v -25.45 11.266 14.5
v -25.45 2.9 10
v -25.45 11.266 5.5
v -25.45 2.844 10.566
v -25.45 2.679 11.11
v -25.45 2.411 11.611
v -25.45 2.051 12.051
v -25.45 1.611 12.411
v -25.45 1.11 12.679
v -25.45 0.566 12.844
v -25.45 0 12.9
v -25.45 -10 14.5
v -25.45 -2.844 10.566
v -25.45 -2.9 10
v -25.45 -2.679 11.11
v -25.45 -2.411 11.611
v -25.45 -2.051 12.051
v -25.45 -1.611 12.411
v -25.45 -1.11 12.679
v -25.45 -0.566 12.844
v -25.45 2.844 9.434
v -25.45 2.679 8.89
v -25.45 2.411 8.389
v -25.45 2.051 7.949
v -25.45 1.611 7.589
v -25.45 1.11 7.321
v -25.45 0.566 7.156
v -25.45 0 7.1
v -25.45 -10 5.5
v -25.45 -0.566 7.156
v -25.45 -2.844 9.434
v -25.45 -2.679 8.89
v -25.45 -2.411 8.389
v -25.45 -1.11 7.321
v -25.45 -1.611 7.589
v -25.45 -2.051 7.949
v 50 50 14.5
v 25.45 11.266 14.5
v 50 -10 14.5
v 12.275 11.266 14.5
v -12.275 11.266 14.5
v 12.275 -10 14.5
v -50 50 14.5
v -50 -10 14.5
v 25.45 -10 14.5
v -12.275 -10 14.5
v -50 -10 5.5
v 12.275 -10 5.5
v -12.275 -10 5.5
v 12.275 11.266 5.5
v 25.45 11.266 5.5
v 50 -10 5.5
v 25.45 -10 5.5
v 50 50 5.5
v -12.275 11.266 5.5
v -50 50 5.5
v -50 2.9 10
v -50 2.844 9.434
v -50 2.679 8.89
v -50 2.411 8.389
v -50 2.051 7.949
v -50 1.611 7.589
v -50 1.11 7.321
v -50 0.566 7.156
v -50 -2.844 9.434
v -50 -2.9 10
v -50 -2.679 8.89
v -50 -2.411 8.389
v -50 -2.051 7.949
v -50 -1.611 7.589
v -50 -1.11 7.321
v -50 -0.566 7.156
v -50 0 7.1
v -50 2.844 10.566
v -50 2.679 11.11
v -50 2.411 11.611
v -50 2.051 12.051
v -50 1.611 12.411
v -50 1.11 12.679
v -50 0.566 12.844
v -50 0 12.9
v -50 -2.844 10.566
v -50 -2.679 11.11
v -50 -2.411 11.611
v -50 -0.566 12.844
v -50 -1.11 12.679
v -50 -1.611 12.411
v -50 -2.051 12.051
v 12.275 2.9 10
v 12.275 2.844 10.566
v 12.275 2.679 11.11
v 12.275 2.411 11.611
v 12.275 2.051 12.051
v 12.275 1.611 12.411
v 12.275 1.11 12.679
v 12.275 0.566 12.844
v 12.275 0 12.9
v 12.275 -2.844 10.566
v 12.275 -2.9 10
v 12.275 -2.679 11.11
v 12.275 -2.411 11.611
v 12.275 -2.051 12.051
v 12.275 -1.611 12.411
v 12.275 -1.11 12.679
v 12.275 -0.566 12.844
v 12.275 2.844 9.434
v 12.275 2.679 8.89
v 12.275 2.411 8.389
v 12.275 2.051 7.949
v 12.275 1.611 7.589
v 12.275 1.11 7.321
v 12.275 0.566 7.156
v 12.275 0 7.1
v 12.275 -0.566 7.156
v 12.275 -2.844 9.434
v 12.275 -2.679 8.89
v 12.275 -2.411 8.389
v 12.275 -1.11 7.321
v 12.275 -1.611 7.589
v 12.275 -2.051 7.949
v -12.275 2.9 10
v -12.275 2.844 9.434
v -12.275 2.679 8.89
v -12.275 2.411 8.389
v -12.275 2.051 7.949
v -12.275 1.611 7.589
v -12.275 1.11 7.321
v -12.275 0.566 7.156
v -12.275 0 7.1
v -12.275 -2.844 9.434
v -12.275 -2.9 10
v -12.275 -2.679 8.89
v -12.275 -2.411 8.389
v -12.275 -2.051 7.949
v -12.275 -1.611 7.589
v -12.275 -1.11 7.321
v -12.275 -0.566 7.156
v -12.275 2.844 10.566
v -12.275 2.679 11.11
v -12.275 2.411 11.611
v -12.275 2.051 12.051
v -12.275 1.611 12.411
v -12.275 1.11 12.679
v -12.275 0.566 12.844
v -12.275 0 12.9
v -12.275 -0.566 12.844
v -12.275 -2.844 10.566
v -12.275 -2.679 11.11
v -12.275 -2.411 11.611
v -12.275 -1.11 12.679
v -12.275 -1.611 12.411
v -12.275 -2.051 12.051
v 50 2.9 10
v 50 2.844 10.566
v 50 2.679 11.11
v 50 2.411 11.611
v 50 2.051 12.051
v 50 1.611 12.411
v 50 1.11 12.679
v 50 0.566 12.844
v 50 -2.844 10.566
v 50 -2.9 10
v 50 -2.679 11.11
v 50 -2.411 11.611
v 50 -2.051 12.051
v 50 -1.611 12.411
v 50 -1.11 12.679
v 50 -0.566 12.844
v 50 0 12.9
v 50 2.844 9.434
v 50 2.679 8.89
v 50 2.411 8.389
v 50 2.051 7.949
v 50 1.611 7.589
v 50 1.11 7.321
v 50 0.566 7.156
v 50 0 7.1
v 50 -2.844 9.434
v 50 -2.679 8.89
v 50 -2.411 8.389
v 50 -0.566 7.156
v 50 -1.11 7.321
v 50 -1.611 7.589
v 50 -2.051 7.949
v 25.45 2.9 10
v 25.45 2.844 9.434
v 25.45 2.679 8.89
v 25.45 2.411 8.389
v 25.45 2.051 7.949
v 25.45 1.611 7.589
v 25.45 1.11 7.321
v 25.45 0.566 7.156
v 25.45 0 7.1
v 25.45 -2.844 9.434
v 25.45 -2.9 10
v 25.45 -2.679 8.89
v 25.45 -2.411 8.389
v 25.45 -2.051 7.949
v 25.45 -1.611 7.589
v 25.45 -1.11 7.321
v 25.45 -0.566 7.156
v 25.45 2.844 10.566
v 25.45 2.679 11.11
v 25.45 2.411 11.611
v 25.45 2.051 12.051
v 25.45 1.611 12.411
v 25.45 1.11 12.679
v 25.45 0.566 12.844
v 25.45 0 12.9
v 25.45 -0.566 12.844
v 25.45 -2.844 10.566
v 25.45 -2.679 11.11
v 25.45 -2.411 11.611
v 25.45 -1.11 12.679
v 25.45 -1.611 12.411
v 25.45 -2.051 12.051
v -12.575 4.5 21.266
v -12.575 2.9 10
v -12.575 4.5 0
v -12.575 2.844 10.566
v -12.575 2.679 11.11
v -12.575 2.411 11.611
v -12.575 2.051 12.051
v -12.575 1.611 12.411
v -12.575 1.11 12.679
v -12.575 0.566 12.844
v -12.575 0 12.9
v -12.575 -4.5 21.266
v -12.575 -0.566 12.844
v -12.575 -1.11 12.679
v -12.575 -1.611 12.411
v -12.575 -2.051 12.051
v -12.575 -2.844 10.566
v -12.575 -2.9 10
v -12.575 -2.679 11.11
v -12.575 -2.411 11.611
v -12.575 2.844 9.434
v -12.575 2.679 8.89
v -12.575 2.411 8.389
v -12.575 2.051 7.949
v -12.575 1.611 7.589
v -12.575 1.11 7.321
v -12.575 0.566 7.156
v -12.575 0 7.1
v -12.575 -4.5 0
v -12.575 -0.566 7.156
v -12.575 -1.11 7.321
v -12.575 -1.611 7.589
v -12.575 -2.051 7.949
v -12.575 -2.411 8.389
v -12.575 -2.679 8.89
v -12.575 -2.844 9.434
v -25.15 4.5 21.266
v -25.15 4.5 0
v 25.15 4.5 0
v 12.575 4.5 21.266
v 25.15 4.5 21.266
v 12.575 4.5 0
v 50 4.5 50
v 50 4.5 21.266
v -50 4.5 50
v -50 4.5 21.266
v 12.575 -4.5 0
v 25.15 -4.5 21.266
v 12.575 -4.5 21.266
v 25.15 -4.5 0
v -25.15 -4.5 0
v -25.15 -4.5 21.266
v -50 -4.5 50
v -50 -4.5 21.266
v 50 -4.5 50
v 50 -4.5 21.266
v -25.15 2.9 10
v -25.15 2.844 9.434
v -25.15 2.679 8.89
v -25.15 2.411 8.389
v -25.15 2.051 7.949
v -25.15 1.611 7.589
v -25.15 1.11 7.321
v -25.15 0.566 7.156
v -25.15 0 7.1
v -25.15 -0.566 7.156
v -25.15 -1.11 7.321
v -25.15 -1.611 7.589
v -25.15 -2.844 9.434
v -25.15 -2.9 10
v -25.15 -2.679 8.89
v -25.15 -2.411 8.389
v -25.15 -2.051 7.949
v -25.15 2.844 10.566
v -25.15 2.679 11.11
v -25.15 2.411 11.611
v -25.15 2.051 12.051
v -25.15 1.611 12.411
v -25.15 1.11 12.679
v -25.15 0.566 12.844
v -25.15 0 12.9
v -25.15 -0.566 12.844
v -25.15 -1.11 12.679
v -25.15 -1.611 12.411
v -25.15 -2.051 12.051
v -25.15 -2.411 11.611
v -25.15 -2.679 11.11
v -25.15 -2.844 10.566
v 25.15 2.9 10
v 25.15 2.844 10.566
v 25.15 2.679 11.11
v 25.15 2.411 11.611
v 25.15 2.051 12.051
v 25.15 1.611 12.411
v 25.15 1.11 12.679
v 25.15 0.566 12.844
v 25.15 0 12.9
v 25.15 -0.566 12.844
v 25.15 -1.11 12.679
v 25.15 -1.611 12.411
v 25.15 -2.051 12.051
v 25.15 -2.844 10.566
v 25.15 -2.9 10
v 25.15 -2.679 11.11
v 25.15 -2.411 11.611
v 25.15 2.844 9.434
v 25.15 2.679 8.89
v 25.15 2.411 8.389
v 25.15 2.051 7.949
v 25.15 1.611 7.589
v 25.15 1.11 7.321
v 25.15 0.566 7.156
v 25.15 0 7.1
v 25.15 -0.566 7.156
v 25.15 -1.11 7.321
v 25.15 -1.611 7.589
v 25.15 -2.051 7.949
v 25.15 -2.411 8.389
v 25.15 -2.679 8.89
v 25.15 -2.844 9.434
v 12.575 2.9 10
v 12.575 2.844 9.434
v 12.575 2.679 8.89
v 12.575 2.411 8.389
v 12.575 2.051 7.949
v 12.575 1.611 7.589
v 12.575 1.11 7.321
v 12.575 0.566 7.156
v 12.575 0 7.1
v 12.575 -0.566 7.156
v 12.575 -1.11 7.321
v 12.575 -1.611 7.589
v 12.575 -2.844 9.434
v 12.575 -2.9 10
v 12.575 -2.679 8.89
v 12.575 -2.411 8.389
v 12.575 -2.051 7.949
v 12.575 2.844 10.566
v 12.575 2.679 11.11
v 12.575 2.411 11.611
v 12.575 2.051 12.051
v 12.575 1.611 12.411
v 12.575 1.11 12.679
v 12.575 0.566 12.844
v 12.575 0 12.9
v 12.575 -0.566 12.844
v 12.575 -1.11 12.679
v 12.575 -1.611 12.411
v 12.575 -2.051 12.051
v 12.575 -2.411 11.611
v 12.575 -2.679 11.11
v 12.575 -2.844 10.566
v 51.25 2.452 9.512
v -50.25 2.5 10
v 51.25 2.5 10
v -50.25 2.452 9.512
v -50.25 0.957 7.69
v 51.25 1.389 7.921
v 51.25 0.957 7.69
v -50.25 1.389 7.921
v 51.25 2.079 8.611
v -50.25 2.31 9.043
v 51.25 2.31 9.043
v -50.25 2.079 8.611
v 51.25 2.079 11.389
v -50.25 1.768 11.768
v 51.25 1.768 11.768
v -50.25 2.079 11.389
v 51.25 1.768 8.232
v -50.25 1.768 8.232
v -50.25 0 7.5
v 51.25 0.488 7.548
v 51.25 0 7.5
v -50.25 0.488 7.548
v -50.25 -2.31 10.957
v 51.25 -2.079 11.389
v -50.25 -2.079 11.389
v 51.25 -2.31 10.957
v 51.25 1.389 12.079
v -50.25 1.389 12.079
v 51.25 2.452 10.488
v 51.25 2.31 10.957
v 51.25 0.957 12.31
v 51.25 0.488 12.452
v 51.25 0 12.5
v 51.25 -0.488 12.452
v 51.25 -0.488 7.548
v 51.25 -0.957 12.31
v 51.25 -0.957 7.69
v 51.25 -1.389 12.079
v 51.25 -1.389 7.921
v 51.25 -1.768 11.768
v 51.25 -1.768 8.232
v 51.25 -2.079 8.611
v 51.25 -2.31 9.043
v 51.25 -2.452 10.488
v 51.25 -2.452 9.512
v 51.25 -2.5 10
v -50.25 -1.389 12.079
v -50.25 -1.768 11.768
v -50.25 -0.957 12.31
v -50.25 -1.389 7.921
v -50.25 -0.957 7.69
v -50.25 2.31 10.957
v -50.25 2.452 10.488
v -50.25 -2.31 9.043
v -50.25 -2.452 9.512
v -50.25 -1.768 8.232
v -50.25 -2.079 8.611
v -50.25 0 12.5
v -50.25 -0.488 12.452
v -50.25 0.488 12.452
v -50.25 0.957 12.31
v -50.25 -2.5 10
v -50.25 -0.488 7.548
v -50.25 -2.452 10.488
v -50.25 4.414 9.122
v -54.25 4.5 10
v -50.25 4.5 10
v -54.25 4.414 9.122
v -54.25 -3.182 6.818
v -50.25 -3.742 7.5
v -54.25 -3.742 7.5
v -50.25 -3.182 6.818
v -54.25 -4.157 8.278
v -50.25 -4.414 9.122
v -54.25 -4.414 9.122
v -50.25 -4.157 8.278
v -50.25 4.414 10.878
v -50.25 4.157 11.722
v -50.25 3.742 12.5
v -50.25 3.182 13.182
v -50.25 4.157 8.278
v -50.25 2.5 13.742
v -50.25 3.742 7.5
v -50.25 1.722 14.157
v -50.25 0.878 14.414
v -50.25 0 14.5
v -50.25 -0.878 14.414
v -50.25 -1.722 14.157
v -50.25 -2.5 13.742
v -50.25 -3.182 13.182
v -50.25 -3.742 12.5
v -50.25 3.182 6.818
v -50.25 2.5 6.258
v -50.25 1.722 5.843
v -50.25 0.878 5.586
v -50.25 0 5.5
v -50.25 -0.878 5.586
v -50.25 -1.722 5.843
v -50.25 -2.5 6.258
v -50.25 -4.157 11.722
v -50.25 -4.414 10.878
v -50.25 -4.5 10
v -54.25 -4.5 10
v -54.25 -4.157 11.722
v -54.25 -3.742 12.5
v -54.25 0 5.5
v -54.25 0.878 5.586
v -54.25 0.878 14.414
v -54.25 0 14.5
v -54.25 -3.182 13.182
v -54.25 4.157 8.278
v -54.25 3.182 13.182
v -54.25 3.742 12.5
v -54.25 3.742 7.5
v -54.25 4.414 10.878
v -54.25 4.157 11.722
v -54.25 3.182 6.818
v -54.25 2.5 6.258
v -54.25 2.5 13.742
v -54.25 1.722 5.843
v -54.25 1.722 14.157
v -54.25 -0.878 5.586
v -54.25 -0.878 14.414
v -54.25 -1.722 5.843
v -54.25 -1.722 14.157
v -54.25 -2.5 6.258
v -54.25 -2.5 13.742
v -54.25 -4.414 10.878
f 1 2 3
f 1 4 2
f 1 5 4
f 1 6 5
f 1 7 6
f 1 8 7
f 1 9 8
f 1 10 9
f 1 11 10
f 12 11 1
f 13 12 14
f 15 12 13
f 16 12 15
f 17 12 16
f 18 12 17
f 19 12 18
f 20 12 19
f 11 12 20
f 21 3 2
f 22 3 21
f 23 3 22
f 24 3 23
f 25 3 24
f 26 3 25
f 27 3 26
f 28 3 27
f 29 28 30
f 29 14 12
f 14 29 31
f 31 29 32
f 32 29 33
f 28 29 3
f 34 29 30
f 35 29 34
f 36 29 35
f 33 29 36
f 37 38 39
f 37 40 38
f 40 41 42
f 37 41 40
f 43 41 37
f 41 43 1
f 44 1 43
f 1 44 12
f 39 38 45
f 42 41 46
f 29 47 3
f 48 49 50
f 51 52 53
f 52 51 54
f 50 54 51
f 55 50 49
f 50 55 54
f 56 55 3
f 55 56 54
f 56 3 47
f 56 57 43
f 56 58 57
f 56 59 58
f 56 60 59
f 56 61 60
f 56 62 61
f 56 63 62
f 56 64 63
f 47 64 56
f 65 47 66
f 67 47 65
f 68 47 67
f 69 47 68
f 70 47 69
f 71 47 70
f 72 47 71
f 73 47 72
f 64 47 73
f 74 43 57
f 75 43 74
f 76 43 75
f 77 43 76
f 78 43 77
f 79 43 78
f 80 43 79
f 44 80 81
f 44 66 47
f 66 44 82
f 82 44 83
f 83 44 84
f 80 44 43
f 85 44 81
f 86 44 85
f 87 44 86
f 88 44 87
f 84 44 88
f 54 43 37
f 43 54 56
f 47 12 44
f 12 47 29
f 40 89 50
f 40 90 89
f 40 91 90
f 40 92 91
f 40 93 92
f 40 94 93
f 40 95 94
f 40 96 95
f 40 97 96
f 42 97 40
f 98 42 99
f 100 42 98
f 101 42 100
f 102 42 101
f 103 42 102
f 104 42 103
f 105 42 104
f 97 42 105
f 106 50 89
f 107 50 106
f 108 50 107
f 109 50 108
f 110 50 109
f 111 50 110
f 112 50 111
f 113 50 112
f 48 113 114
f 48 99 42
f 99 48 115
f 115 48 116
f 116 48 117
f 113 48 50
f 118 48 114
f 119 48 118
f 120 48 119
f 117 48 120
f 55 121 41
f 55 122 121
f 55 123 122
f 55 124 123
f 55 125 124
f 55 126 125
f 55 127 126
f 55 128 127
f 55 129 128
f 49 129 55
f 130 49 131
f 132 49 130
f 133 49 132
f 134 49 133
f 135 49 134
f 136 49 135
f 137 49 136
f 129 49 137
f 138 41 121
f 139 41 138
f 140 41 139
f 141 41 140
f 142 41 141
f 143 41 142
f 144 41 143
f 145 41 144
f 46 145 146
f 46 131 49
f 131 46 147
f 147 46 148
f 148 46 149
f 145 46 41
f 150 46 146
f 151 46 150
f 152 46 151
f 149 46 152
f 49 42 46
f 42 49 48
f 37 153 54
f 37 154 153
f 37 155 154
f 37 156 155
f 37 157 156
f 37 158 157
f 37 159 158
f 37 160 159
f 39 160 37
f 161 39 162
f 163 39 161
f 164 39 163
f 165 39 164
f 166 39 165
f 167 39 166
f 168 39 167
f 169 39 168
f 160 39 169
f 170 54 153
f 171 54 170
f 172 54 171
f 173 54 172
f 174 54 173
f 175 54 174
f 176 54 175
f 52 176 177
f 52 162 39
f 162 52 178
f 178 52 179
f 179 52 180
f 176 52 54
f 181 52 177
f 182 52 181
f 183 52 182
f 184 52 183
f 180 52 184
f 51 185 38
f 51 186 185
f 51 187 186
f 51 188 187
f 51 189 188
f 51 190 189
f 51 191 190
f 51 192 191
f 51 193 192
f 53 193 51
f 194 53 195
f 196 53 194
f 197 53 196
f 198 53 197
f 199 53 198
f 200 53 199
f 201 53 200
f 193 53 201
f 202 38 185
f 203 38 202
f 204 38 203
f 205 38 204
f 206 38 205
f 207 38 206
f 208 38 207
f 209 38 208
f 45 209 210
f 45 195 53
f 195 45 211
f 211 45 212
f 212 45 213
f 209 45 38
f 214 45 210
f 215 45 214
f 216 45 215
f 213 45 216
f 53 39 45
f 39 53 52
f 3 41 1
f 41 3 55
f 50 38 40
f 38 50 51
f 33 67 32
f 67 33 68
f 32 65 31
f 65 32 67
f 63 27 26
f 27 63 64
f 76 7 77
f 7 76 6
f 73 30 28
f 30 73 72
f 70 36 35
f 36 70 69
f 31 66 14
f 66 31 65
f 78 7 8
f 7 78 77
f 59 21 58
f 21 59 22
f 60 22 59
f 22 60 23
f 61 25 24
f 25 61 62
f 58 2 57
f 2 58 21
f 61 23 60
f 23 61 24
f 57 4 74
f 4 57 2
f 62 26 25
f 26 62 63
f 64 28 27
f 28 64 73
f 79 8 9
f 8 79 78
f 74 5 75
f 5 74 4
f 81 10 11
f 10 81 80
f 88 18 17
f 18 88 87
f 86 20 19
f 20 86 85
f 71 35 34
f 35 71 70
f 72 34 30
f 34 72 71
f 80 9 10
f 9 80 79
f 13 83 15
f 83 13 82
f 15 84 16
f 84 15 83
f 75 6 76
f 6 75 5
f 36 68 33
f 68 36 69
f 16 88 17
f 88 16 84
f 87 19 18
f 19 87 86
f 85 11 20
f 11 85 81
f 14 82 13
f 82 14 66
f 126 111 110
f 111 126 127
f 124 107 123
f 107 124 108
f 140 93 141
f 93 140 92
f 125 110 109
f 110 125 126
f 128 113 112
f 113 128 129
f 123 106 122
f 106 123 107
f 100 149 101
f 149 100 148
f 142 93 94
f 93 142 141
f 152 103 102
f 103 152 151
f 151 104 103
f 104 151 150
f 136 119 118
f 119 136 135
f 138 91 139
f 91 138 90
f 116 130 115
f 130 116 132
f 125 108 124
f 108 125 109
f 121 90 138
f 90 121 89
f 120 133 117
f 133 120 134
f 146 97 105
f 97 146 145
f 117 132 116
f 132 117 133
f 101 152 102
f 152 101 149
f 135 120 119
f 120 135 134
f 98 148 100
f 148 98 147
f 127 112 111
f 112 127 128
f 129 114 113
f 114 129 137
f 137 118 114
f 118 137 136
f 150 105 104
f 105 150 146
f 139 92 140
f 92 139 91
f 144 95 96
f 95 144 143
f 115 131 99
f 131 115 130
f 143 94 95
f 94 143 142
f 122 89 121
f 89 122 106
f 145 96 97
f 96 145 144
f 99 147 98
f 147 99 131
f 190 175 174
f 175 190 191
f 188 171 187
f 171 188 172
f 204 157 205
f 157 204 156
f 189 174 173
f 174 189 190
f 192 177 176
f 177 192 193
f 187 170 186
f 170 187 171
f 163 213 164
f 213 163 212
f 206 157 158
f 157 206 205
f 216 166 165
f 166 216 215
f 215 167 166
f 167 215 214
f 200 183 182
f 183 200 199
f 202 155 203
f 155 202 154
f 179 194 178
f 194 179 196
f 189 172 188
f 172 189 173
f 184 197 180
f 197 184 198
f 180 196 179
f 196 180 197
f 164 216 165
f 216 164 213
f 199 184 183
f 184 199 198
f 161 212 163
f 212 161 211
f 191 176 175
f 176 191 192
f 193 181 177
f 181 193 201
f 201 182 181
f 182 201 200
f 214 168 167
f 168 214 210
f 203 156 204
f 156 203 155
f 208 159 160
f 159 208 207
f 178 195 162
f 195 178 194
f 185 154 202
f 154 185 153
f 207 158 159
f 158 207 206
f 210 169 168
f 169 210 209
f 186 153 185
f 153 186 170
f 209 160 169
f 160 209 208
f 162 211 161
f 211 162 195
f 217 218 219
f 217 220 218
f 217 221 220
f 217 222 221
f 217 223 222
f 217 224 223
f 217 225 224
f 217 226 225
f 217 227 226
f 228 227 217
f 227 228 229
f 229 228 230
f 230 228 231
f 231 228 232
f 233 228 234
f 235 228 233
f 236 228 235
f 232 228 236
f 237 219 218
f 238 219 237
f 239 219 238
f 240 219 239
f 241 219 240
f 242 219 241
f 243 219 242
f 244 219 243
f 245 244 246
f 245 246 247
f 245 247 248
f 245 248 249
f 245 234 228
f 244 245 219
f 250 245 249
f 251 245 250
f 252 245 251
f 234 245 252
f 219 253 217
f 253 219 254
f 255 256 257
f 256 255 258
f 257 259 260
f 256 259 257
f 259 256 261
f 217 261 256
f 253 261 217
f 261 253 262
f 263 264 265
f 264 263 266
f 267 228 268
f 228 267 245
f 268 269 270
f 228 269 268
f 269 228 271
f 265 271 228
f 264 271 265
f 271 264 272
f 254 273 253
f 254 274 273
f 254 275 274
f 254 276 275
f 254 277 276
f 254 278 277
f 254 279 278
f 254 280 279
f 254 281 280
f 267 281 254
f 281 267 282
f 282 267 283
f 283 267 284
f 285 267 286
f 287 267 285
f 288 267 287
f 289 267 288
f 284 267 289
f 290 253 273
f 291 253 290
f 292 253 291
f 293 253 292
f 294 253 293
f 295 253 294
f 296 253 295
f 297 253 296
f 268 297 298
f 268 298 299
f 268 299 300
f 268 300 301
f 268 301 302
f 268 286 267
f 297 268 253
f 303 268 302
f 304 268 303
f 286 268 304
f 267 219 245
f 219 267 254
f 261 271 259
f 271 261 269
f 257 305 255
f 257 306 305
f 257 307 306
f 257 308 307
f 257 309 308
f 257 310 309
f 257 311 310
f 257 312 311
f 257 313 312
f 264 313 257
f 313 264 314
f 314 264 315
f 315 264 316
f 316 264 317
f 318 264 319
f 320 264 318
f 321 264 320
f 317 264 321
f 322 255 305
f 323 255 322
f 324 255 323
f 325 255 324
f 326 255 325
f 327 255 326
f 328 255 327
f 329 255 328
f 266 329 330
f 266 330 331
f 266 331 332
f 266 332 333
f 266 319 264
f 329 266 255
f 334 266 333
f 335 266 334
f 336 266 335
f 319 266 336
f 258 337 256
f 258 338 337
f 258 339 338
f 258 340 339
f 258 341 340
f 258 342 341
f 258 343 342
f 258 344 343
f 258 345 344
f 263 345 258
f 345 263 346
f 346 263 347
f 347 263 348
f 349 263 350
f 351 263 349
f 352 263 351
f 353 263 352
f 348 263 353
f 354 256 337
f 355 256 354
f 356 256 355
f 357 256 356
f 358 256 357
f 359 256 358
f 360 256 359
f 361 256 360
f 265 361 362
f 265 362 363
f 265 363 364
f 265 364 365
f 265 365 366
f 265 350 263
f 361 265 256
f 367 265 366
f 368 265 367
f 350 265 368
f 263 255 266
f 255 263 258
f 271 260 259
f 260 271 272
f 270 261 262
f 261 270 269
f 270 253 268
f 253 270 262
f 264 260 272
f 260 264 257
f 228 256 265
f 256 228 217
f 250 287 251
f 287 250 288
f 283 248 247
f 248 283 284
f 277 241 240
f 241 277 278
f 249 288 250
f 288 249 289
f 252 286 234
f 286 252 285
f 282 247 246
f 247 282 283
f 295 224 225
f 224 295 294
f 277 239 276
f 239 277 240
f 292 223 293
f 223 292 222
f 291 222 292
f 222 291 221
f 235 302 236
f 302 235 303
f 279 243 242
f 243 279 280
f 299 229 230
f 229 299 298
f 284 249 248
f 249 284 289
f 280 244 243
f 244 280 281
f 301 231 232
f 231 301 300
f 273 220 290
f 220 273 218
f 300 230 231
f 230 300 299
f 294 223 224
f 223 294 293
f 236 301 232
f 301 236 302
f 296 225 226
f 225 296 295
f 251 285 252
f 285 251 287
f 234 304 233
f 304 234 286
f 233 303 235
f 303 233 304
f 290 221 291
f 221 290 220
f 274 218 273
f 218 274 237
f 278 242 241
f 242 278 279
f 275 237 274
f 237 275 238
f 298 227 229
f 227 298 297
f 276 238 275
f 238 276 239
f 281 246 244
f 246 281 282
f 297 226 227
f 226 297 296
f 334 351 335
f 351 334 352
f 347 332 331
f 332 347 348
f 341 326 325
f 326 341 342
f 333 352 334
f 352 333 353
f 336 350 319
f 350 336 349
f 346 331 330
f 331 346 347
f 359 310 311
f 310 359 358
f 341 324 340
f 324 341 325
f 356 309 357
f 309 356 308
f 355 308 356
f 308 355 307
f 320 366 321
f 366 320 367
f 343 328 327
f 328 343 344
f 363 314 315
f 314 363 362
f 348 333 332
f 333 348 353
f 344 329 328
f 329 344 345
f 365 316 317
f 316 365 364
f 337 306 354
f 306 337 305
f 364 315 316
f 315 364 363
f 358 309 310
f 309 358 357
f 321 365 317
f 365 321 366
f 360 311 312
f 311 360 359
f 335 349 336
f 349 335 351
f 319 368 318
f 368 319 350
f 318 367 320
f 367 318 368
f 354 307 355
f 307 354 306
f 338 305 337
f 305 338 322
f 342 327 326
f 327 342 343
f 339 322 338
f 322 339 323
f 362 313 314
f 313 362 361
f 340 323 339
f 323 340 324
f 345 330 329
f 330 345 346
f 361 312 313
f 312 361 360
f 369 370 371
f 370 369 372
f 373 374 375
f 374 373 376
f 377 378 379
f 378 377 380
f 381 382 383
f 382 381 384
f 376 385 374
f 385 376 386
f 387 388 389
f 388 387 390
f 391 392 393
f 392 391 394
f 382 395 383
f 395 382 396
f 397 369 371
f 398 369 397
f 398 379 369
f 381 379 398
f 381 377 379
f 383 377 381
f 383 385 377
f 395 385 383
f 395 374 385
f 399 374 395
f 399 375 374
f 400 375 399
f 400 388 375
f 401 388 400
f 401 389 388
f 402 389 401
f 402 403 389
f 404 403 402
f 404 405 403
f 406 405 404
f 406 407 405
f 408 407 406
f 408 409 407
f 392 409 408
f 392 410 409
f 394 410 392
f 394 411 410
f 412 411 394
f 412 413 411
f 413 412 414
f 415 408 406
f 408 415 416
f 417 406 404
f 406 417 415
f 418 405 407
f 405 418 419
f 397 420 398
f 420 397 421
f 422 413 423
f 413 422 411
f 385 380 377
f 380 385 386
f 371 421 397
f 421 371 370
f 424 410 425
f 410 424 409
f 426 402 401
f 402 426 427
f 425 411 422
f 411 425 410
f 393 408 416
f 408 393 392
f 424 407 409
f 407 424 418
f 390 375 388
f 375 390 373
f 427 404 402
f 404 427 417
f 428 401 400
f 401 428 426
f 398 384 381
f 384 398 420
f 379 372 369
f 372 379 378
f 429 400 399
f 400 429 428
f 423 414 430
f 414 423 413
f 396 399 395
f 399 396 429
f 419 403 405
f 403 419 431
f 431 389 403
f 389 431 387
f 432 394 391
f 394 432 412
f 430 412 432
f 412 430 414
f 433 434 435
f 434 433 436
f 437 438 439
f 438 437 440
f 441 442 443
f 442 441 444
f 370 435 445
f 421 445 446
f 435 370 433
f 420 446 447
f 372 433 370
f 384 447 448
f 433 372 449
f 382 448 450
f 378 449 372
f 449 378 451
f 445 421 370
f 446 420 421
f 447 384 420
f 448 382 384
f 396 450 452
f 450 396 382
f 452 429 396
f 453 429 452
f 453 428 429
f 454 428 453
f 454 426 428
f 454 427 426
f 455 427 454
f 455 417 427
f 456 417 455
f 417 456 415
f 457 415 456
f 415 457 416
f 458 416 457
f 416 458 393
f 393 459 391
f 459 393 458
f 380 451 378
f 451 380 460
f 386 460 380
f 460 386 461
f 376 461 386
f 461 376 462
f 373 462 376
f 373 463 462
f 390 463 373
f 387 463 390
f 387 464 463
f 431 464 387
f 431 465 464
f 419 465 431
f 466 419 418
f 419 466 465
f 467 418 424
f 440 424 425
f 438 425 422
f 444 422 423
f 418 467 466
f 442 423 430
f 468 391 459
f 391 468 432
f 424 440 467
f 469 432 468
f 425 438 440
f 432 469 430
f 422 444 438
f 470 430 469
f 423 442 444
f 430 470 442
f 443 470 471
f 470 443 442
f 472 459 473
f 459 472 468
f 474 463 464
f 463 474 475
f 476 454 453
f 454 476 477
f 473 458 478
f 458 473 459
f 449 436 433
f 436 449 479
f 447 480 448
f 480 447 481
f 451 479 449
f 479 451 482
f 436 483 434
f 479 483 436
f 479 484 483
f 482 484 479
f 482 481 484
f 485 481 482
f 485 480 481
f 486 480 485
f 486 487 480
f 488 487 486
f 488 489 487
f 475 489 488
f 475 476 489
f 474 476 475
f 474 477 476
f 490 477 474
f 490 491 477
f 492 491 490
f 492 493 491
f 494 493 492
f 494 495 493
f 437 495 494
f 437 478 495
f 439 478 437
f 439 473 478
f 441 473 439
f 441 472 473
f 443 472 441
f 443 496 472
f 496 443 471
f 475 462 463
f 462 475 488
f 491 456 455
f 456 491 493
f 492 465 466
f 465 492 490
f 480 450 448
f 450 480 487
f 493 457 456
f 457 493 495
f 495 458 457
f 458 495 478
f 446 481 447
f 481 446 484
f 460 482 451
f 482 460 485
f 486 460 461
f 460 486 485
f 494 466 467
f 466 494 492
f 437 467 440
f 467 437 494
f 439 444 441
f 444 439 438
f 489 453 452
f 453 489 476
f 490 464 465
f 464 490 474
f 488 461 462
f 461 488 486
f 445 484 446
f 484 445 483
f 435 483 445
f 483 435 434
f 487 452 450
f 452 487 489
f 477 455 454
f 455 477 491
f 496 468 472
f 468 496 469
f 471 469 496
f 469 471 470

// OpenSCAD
$fn = 32;

// ------------------------------------------------------------------------
// Butt hinge: hinge 100 mm, leaf swung 270 deg
// Every part is its own module, assembly() places every instance.
// ------------------------------------------------------------------------

// --- part 1 ---
module hinge_base() {
  difference() {
    union() {
      translate([-50, -10, -4.5]) cube([24.55, 60, 9]);
      translate([-12.275, -10, -4.5]) cube([24.55, 60, 9]);
      translate([25.45, -10, -4.5]) cube([24.55, 60, 9]);
      translate([-50, 11.266, -4.5]) cube([100, 38.734, 9]);
    }
    translate([-37.725, 0, 0]) rotate([0, 90, 0]) cylinder(h = 26.55, d = 5.8, center = true);
    translate([0, 0, 0]) rotate([0, 90, 0]) cylinder(h = 26.55, d = 5.8, center = true);
    translate([37.725, 0, 0]) rotate([0, 90, 0]) cylinder(h = 26.55, d = 5.8, center = true);
  }
}

// --- part 2 ---
module hinge_mover() {
  difference() {
    union() {
      translate([-25.15, -40, -4.5]) cube([12.575, 50, 9]);
      translate([12.575, -40, -4.5]) cube([12.575, 50, 9]);
      translate([-50, -40, -4.5]) cube([100, 28.734, 9]);
    }
    translate([-18.863, 0, 0]) rotate([0, 90, 0]) cylinder(h = 14.575, d = 5.8, center = true);
    translate([18.863, 0, 0]) rotate([0, 90, 0]) cylinder(h = 14.575, d = 5.8, center = true);
  }
}

// --- part 3 ---
module hinge_pin() {
  rotate([0, 90, 0]) cylinder(h = 102.5, d = 5, center = true);
  translate([-54.25, 0, 0]) rotate([0, 90, 0]) cylinder(h = 4, d = 9);
}

// --- assembly ---
module assembly() {
  color([0.80, 0.24, 0.20]) translate([0, 0, 10]) rotate([0, 0, 0]) hinge_base();
  color([0.20, 0.45, 0.75]) translate([0, 0, 10]) rotate([270, 0, 0]) hinge_mover();
  color([0.25, 0.62, 0.32]) translate([0, 0, 10]) rotate([0, 0, 0]) hinge_pin();
}

assembly();
